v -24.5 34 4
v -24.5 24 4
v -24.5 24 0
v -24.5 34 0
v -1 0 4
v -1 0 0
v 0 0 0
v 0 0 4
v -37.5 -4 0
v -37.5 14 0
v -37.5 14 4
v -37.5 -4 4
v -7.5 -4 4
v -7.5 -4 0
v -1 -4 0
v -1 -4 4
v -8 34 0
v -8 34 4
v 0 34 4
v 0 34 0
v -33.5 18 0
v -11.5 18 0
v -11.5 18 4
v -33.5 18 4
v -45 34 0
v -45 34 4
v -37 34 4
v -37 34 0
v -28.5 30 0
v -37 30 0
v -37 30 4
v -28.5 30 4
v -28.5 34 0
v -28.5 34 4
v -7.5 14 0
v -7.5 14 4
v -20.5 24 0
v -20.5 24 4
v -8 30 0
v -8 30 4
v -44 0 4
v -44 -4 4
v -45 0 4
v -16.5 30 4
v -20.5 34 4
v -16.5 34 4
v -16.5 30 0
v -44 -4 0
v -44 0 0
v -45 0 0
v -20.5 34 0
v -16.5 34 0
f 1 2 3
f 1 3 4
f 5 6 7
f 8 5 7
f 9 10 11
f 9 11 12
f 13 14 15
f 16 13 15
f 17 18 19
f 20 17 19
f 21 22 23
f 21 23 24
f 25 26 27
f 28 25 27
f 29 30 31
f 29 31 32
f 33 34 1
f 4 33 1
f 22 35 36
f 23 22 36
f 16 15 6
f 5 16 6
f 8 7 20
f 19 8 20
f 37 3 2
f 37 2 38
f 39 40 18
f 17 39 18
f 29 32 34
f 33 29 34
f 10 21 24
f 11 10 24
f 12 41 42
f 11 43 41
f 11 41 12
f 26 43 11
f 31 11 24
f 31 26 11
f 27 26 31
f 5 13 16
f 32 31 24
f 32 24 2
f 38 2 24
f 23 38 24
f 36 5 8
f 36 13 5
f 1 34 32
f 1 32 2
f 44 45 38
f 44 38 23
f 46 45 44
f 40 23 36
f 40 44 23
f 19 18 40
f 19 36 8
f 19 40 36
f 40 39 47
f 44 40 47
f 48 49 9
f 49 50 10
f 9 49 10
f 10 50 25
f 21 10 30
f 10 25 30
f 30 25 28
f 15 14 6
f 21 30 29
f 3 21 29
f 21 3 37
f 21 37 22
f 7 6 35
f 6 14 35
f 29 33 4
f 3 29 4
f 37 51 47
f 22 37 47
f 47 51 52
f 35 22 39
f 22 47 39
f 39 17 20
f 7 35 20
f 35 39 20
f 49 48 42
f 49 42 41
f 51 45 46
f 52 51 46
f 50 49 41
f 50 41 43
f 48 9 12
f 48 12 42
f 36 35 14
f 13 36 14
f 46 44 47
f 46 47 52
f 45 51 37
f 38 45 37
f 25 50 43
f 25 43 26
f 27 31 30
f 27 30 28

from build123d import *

# Parameters (mm, degrees)
BOSS_EXTRUDE1_DEPTH      = 4
CHAMFER2_SIZE            = 4
CHAMFER2_OF_MIRROR1_SIZE = 4
SKETCH2_W                = 4
SKETCH2_H                = 4
SKETCH2_W_2              = 8
BOSS_EXTRUDE2_DEPTH      = 4


with BuildPart() as part:
    # Sketch1 → Boss-Extrude1 (new body)
    with BuildSketch(Plane.XY):
        Polygon((0, 0), (0, 30), (-20.5, 30), (-20.5, 24), (-22.5, 24), (-22.5, 18), (-7.5, 18), (-7.5, -4), (-1, -4), (-1, 0), align=None)
    boss_extrude1 = extrude(amount=BOSS_EXTRUDE1_DEPTH)

    # Chamfer2
    chamfer2_edges = [part.edges().sort_by_distance(p)[0] for p in [
        (-7.5, 18, 2),
    ]]
    chamfer(chamfer2_edges, length=CHAMFER2_SIZE)

    # Mirror1: Boss-Extrude1 across plane
    add(boss_extrude1.mirror(Plane(origin=(-22.5, 24, 4), x_dir=(0, 0, 1), z_dir=(1, 0, 0))))

    # Chamfer2 of Mirror1
    chamfer2_of_mirror1_edges = [part.edges().sort_by_distance(p)[0] for p in [
        (-37.5, 18, 2),
    ]]
    chamfer(chamfer2_of_mirror1_edges, length=CHAMFER2_OF_MIRROR1_SIZE)

    # Sketch2 → Boss-Extrude2 (add)
    with BuildSketch(Plane.XY.offset(4)):
        with Locations((-26.5, 32)):
            Rectangle(SKETCH2_W, SKETCH2_H)
        with Locations((-18.5, 32)):
            Rectangle(SKETCH2_W, SKETCH2_H)
        with Locations((-4, 32)):
            Rectangle(SKETCH2_W_2, SKETCH2_H)
        with Locations((-41, 32)):
            Rectangle(SKETCH2_W_2, SKETCH2_H)
    extrude(amount=-BOSS_EXTRUDE2_DEPTH)


solid = part.part
